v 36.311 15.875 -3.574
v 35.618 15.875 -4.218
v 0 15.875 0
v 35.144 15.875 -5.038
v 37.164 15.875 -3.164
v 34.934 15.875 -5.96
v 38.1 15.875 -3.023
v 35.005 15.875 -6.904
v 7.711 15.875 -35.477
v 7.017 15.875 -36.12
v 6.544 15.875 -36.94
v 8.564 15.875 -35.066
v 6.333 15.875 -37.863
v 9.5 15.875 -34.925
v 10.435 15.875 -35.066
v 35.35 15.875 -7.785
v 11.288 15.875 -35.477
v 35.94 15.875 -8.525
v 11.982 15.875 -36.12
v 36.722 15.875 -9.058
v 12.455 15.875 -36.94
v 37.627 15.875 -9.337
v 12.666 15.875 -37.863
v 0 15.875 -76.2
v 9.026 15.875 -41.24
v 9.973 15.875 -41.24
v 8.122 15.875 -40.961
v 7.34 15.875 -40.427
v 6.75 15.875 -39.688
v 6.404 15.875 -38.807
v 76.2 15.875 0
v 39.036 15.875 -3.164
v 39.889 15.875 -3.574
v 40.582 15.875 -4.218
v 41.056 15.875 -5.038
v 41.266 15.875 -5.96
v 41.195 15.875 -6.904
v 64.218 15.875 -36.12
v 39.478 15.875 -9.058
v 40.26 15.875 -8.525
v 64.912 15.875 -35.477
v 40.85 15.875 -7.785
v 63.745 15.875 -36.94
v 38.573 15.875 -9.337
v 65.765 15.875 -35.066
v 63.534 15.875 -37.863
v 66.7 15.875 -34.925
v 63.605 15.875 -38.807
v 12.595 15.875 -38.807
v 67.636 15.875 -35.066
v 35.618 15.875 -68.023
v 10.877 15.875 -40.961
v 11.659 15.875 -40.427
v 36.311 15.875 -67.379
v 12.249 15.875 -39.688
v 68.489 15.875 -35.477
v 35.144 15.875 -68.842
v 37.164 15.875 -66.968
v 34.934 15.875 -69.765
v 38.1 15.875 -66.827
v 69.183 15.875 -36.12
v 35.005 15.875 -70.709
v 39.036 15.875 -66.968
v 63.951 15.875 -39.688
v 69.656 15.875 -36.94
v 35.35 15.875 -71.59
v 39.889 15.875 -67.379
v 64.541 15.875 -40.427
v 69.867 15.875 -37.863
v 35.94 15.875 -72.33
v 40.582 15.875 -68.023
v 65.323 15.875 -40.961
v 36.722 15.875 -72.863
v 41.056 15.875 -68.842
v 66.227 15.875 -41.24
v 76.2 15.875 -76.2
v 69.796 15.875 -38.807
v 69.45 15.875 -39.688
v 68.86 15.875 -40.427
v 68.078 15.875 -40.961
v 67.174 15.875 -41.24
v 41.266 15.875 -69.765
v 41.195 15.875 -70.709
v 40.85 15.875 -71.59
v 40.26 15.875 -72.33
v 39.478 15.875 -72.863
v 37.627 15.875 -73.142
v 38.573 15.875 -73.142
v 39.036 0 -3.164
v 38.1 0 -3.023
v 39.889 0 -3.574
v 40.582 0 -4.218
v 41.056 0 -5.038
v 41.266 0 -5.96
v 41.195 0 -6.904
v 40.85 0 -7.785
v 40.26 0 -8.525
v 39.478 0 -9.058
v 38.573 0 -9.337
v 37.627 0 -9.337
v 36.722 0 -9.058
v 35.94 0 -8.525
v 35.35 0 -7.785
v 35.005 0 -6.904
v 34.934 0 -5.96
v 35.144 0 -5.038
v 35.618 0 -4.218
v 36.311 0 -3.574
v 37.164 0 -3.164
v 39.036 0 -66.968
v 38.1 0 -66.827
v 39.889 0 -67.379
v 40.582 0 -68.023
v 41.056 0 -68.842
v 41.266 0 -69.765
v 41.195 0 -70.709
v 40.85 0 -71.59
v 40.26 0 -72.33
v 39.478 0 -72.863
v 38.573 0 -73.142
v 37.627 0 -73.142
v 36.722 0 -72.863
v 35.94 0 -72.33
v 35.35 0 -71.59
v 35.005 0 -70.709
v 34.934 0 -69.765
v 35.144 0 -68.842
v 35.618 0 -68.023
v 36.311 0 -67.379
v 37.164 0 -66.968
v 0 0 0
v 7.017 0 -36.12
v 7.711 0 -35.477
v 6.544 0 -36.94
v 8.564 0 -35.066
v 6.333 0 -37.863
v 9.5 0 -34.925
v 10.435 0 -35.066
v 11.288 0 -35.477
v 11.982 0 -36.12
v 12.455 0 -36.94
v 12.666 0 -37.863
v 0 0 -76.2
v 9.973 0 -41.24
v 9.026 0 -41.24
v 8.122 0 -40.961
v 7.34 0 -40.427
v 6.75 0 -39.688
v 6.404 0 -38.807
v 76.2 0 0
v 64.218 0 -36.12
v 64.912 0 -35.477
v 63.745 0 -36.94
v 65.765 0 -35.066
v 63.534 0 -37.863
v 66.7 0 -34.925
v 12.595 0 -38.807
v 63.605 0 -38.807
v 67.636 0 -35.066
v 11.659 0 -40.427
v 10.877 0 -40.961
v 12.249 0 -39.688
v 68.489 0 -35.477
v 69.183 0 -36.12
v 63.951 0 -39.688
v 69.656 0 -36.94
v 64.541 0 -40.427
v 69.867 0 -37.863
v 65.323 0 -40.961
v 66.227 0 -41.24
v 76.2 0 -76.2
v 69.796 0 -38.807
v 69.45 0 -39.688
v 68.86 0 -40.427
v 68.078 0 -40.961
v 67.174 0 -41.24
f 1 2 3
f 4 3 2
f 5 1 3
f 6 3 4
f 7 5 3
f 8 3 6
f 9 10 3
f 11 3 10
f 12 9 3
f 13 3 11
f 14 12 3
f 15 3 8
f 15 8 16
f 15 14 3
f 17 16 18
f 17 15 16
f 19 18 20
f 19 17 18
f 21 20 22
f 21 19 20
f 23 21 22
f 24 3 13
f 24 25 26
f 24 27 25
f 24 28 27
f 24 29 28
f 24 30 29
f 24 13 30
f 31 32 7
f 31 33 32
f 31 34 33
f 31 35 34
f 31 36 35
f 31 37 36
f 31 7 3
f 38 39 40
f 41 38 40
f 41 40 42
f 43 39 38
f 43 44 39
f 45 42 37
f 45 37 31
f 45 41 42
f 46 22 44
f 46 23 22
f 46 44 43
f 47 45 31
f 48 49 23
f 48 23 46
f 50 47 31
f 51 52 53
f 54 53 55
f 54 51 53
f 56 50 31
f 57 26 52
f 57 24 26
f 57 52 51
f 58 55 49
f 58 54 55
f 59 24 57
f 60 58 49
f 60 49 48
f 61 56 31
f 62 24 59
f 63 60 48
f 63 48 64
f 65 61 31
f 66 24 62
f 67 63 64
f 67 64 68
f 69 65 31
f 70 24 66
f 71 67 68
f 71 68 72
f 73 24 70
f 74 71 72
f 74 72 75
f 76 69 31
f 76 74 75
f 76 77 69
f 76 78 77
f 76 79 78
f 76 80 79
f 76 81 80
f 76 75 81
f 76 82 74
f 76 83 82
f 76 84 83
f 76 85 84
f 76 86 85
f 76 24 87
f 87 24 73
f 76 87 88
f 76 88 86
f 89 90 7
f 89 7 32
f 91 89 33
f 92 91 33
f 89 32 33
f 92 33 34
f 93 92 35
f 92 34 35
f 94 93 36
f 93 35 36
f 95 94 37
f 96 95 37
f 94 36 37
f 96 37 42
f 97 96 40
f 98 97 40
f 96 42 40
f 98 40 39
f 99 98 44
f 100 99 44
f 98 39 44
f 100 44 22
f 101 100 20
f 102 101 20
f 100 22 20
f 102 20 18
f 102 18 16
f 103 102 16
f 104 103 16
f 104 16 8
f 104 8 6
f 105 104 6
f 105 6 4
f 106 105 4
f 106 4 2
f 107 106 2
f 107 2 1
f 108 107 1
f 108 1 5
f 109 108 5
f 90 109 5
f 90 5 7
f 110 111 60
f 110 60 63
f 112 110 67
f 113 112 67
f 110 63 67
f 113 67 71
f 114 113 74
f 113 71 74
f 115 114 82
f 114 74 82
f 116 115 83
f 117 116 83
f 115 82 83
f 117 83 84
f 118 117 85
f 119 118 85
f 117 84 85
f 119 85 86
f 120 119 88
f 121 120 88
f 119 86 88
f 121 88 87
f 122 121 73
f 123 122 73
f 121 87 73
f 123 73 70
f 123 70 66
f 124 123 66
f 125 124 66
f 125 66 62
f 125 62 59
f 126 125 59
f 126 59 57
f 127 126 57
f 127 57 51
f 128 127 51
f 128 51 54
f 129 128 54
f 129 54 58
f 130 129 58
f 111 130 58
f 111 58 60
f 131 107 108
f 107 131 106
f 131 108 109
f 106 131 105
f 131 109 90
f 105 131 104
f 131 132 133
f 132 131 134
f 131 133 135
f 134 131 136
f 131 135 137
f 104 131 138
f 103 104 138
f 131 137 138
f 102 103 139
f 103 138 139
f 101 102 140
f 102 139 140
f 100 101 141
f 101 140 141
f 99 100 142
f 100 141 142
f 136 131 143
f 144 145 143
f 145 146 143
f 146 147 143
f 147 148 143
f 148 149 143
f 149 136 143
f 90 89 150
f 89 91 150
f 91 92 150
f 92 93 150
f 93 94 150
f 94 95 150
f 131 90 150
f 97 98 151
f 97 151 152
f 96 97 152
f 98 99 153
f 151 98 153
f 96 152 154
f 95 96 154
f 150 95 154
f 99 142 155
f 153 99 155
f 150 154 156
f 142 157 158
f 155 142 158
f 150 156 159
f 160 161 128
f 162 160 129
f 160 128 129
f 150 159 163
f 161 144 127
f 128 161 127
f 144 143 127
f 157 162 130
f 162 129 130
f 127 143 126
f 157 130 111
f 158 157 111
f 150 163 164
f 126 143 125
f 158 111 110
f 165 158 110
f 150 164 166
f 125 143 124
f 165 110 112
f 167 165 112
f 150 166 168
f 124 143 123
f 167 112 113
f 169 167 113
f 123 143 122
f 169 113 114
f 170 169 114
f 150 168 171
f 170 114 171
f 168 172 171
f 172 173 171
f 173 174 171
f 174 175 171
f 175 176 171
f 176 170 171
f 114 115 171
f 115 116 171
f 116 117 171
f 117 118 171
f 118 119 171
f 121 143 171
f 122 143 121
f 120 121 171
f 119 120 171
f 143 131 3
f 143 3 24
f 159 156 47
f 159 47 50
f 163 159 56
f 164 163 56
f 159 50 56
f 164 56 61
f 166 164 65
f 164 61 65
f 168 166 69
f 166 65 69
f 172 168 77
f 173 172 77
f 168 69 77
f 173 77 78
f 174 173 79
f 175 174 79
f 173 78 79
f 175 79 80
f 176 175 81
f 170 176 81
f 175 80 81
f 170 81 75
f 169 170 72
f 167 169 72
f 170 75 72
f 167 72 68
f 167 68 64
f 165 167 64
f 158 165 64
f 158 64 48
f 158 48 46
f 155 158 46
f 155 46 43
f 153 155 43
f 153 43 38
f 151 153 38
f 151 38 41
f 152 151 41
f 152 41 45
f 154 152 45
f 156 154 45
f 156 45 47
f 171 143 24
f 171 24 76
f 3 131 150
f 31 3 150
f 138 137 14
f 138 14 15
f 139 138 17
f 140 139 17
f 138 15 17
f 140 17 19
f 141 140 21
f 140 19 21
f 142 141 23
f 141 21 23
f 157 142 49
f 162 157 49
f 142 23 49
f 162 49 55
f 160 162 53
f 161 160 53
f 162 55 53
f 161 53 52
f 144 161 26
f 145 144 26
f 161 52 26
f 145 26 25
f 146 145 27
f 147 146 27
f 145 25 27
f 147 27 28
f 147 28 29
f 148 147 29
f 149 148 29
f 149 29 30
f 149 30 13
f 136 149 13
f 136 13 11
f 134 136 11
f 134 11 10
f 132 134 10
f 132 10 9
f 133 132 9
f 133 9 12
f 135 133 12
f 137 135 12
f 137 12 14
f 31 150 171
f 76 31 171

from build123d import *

# Parameters (mm, degrees)
SKETCH1_W           = 76.2
SKETCH1_H           = 76.2
BOSS_EXTRUDE1_DEPTH = 15.875
SKETCH2_R           = 3.175
CUT_EXTRUDE1_DEPTH  = 109.92610167
SKETCH2_3_R         = 3.175
CUT_EXTRUDE2_DEPTH  = 109.92610167


with BuildPart() as part:
    # Sketch1 → Boss-Extrude1 (new body)
    with BuildSketch(Plane(origin=(0, 0, 0), x_dir=(1, 0, 0), z_dir=(0, 1, 0))):
        with Locations((38.1, 38.1)):
            Rectangle(SKETCH1_W, SKETCH1_H)
    extrude(amount=BOSS_EXTRUDE1_DEPTH)

    # Sketch2 → Cut-Extrude1 (cut, through all)
    with BuildSketch(Plane(origin=(0, 15.875, 0), x_dir=(1, 0, 0), z_dir=(0, 1, 0))):
        with Locations((38.1, 70.00228824)):
            Circle(SKETCH2_R)
        with Locations((38.1, 6.19771176)):
            Circle(SKETCH2_R)
    extrude(amount=-CUT_EXTRUDE1_DEPTH, mode=Mode.SUBTRACT)

    # Sketch2<3> → Cut-Extrude2 (cut, through all)
    with BuildSketch(Plane(origin=(0, 15.875, 0), x_dir=(1, 0, 0), z_dir=(0, 1, 0))):
        with Locations((9.4996, 38.1)):
            Circle(SKETCH2_3_R)
        with Locations((66.7004, 38.1)):
            Circle(SKETCH2_3_R)
    extrude(amount=-CUT_EXTRUDE2_DEPTH, mode=Mode.SUBTRACT)


solid = part.part
